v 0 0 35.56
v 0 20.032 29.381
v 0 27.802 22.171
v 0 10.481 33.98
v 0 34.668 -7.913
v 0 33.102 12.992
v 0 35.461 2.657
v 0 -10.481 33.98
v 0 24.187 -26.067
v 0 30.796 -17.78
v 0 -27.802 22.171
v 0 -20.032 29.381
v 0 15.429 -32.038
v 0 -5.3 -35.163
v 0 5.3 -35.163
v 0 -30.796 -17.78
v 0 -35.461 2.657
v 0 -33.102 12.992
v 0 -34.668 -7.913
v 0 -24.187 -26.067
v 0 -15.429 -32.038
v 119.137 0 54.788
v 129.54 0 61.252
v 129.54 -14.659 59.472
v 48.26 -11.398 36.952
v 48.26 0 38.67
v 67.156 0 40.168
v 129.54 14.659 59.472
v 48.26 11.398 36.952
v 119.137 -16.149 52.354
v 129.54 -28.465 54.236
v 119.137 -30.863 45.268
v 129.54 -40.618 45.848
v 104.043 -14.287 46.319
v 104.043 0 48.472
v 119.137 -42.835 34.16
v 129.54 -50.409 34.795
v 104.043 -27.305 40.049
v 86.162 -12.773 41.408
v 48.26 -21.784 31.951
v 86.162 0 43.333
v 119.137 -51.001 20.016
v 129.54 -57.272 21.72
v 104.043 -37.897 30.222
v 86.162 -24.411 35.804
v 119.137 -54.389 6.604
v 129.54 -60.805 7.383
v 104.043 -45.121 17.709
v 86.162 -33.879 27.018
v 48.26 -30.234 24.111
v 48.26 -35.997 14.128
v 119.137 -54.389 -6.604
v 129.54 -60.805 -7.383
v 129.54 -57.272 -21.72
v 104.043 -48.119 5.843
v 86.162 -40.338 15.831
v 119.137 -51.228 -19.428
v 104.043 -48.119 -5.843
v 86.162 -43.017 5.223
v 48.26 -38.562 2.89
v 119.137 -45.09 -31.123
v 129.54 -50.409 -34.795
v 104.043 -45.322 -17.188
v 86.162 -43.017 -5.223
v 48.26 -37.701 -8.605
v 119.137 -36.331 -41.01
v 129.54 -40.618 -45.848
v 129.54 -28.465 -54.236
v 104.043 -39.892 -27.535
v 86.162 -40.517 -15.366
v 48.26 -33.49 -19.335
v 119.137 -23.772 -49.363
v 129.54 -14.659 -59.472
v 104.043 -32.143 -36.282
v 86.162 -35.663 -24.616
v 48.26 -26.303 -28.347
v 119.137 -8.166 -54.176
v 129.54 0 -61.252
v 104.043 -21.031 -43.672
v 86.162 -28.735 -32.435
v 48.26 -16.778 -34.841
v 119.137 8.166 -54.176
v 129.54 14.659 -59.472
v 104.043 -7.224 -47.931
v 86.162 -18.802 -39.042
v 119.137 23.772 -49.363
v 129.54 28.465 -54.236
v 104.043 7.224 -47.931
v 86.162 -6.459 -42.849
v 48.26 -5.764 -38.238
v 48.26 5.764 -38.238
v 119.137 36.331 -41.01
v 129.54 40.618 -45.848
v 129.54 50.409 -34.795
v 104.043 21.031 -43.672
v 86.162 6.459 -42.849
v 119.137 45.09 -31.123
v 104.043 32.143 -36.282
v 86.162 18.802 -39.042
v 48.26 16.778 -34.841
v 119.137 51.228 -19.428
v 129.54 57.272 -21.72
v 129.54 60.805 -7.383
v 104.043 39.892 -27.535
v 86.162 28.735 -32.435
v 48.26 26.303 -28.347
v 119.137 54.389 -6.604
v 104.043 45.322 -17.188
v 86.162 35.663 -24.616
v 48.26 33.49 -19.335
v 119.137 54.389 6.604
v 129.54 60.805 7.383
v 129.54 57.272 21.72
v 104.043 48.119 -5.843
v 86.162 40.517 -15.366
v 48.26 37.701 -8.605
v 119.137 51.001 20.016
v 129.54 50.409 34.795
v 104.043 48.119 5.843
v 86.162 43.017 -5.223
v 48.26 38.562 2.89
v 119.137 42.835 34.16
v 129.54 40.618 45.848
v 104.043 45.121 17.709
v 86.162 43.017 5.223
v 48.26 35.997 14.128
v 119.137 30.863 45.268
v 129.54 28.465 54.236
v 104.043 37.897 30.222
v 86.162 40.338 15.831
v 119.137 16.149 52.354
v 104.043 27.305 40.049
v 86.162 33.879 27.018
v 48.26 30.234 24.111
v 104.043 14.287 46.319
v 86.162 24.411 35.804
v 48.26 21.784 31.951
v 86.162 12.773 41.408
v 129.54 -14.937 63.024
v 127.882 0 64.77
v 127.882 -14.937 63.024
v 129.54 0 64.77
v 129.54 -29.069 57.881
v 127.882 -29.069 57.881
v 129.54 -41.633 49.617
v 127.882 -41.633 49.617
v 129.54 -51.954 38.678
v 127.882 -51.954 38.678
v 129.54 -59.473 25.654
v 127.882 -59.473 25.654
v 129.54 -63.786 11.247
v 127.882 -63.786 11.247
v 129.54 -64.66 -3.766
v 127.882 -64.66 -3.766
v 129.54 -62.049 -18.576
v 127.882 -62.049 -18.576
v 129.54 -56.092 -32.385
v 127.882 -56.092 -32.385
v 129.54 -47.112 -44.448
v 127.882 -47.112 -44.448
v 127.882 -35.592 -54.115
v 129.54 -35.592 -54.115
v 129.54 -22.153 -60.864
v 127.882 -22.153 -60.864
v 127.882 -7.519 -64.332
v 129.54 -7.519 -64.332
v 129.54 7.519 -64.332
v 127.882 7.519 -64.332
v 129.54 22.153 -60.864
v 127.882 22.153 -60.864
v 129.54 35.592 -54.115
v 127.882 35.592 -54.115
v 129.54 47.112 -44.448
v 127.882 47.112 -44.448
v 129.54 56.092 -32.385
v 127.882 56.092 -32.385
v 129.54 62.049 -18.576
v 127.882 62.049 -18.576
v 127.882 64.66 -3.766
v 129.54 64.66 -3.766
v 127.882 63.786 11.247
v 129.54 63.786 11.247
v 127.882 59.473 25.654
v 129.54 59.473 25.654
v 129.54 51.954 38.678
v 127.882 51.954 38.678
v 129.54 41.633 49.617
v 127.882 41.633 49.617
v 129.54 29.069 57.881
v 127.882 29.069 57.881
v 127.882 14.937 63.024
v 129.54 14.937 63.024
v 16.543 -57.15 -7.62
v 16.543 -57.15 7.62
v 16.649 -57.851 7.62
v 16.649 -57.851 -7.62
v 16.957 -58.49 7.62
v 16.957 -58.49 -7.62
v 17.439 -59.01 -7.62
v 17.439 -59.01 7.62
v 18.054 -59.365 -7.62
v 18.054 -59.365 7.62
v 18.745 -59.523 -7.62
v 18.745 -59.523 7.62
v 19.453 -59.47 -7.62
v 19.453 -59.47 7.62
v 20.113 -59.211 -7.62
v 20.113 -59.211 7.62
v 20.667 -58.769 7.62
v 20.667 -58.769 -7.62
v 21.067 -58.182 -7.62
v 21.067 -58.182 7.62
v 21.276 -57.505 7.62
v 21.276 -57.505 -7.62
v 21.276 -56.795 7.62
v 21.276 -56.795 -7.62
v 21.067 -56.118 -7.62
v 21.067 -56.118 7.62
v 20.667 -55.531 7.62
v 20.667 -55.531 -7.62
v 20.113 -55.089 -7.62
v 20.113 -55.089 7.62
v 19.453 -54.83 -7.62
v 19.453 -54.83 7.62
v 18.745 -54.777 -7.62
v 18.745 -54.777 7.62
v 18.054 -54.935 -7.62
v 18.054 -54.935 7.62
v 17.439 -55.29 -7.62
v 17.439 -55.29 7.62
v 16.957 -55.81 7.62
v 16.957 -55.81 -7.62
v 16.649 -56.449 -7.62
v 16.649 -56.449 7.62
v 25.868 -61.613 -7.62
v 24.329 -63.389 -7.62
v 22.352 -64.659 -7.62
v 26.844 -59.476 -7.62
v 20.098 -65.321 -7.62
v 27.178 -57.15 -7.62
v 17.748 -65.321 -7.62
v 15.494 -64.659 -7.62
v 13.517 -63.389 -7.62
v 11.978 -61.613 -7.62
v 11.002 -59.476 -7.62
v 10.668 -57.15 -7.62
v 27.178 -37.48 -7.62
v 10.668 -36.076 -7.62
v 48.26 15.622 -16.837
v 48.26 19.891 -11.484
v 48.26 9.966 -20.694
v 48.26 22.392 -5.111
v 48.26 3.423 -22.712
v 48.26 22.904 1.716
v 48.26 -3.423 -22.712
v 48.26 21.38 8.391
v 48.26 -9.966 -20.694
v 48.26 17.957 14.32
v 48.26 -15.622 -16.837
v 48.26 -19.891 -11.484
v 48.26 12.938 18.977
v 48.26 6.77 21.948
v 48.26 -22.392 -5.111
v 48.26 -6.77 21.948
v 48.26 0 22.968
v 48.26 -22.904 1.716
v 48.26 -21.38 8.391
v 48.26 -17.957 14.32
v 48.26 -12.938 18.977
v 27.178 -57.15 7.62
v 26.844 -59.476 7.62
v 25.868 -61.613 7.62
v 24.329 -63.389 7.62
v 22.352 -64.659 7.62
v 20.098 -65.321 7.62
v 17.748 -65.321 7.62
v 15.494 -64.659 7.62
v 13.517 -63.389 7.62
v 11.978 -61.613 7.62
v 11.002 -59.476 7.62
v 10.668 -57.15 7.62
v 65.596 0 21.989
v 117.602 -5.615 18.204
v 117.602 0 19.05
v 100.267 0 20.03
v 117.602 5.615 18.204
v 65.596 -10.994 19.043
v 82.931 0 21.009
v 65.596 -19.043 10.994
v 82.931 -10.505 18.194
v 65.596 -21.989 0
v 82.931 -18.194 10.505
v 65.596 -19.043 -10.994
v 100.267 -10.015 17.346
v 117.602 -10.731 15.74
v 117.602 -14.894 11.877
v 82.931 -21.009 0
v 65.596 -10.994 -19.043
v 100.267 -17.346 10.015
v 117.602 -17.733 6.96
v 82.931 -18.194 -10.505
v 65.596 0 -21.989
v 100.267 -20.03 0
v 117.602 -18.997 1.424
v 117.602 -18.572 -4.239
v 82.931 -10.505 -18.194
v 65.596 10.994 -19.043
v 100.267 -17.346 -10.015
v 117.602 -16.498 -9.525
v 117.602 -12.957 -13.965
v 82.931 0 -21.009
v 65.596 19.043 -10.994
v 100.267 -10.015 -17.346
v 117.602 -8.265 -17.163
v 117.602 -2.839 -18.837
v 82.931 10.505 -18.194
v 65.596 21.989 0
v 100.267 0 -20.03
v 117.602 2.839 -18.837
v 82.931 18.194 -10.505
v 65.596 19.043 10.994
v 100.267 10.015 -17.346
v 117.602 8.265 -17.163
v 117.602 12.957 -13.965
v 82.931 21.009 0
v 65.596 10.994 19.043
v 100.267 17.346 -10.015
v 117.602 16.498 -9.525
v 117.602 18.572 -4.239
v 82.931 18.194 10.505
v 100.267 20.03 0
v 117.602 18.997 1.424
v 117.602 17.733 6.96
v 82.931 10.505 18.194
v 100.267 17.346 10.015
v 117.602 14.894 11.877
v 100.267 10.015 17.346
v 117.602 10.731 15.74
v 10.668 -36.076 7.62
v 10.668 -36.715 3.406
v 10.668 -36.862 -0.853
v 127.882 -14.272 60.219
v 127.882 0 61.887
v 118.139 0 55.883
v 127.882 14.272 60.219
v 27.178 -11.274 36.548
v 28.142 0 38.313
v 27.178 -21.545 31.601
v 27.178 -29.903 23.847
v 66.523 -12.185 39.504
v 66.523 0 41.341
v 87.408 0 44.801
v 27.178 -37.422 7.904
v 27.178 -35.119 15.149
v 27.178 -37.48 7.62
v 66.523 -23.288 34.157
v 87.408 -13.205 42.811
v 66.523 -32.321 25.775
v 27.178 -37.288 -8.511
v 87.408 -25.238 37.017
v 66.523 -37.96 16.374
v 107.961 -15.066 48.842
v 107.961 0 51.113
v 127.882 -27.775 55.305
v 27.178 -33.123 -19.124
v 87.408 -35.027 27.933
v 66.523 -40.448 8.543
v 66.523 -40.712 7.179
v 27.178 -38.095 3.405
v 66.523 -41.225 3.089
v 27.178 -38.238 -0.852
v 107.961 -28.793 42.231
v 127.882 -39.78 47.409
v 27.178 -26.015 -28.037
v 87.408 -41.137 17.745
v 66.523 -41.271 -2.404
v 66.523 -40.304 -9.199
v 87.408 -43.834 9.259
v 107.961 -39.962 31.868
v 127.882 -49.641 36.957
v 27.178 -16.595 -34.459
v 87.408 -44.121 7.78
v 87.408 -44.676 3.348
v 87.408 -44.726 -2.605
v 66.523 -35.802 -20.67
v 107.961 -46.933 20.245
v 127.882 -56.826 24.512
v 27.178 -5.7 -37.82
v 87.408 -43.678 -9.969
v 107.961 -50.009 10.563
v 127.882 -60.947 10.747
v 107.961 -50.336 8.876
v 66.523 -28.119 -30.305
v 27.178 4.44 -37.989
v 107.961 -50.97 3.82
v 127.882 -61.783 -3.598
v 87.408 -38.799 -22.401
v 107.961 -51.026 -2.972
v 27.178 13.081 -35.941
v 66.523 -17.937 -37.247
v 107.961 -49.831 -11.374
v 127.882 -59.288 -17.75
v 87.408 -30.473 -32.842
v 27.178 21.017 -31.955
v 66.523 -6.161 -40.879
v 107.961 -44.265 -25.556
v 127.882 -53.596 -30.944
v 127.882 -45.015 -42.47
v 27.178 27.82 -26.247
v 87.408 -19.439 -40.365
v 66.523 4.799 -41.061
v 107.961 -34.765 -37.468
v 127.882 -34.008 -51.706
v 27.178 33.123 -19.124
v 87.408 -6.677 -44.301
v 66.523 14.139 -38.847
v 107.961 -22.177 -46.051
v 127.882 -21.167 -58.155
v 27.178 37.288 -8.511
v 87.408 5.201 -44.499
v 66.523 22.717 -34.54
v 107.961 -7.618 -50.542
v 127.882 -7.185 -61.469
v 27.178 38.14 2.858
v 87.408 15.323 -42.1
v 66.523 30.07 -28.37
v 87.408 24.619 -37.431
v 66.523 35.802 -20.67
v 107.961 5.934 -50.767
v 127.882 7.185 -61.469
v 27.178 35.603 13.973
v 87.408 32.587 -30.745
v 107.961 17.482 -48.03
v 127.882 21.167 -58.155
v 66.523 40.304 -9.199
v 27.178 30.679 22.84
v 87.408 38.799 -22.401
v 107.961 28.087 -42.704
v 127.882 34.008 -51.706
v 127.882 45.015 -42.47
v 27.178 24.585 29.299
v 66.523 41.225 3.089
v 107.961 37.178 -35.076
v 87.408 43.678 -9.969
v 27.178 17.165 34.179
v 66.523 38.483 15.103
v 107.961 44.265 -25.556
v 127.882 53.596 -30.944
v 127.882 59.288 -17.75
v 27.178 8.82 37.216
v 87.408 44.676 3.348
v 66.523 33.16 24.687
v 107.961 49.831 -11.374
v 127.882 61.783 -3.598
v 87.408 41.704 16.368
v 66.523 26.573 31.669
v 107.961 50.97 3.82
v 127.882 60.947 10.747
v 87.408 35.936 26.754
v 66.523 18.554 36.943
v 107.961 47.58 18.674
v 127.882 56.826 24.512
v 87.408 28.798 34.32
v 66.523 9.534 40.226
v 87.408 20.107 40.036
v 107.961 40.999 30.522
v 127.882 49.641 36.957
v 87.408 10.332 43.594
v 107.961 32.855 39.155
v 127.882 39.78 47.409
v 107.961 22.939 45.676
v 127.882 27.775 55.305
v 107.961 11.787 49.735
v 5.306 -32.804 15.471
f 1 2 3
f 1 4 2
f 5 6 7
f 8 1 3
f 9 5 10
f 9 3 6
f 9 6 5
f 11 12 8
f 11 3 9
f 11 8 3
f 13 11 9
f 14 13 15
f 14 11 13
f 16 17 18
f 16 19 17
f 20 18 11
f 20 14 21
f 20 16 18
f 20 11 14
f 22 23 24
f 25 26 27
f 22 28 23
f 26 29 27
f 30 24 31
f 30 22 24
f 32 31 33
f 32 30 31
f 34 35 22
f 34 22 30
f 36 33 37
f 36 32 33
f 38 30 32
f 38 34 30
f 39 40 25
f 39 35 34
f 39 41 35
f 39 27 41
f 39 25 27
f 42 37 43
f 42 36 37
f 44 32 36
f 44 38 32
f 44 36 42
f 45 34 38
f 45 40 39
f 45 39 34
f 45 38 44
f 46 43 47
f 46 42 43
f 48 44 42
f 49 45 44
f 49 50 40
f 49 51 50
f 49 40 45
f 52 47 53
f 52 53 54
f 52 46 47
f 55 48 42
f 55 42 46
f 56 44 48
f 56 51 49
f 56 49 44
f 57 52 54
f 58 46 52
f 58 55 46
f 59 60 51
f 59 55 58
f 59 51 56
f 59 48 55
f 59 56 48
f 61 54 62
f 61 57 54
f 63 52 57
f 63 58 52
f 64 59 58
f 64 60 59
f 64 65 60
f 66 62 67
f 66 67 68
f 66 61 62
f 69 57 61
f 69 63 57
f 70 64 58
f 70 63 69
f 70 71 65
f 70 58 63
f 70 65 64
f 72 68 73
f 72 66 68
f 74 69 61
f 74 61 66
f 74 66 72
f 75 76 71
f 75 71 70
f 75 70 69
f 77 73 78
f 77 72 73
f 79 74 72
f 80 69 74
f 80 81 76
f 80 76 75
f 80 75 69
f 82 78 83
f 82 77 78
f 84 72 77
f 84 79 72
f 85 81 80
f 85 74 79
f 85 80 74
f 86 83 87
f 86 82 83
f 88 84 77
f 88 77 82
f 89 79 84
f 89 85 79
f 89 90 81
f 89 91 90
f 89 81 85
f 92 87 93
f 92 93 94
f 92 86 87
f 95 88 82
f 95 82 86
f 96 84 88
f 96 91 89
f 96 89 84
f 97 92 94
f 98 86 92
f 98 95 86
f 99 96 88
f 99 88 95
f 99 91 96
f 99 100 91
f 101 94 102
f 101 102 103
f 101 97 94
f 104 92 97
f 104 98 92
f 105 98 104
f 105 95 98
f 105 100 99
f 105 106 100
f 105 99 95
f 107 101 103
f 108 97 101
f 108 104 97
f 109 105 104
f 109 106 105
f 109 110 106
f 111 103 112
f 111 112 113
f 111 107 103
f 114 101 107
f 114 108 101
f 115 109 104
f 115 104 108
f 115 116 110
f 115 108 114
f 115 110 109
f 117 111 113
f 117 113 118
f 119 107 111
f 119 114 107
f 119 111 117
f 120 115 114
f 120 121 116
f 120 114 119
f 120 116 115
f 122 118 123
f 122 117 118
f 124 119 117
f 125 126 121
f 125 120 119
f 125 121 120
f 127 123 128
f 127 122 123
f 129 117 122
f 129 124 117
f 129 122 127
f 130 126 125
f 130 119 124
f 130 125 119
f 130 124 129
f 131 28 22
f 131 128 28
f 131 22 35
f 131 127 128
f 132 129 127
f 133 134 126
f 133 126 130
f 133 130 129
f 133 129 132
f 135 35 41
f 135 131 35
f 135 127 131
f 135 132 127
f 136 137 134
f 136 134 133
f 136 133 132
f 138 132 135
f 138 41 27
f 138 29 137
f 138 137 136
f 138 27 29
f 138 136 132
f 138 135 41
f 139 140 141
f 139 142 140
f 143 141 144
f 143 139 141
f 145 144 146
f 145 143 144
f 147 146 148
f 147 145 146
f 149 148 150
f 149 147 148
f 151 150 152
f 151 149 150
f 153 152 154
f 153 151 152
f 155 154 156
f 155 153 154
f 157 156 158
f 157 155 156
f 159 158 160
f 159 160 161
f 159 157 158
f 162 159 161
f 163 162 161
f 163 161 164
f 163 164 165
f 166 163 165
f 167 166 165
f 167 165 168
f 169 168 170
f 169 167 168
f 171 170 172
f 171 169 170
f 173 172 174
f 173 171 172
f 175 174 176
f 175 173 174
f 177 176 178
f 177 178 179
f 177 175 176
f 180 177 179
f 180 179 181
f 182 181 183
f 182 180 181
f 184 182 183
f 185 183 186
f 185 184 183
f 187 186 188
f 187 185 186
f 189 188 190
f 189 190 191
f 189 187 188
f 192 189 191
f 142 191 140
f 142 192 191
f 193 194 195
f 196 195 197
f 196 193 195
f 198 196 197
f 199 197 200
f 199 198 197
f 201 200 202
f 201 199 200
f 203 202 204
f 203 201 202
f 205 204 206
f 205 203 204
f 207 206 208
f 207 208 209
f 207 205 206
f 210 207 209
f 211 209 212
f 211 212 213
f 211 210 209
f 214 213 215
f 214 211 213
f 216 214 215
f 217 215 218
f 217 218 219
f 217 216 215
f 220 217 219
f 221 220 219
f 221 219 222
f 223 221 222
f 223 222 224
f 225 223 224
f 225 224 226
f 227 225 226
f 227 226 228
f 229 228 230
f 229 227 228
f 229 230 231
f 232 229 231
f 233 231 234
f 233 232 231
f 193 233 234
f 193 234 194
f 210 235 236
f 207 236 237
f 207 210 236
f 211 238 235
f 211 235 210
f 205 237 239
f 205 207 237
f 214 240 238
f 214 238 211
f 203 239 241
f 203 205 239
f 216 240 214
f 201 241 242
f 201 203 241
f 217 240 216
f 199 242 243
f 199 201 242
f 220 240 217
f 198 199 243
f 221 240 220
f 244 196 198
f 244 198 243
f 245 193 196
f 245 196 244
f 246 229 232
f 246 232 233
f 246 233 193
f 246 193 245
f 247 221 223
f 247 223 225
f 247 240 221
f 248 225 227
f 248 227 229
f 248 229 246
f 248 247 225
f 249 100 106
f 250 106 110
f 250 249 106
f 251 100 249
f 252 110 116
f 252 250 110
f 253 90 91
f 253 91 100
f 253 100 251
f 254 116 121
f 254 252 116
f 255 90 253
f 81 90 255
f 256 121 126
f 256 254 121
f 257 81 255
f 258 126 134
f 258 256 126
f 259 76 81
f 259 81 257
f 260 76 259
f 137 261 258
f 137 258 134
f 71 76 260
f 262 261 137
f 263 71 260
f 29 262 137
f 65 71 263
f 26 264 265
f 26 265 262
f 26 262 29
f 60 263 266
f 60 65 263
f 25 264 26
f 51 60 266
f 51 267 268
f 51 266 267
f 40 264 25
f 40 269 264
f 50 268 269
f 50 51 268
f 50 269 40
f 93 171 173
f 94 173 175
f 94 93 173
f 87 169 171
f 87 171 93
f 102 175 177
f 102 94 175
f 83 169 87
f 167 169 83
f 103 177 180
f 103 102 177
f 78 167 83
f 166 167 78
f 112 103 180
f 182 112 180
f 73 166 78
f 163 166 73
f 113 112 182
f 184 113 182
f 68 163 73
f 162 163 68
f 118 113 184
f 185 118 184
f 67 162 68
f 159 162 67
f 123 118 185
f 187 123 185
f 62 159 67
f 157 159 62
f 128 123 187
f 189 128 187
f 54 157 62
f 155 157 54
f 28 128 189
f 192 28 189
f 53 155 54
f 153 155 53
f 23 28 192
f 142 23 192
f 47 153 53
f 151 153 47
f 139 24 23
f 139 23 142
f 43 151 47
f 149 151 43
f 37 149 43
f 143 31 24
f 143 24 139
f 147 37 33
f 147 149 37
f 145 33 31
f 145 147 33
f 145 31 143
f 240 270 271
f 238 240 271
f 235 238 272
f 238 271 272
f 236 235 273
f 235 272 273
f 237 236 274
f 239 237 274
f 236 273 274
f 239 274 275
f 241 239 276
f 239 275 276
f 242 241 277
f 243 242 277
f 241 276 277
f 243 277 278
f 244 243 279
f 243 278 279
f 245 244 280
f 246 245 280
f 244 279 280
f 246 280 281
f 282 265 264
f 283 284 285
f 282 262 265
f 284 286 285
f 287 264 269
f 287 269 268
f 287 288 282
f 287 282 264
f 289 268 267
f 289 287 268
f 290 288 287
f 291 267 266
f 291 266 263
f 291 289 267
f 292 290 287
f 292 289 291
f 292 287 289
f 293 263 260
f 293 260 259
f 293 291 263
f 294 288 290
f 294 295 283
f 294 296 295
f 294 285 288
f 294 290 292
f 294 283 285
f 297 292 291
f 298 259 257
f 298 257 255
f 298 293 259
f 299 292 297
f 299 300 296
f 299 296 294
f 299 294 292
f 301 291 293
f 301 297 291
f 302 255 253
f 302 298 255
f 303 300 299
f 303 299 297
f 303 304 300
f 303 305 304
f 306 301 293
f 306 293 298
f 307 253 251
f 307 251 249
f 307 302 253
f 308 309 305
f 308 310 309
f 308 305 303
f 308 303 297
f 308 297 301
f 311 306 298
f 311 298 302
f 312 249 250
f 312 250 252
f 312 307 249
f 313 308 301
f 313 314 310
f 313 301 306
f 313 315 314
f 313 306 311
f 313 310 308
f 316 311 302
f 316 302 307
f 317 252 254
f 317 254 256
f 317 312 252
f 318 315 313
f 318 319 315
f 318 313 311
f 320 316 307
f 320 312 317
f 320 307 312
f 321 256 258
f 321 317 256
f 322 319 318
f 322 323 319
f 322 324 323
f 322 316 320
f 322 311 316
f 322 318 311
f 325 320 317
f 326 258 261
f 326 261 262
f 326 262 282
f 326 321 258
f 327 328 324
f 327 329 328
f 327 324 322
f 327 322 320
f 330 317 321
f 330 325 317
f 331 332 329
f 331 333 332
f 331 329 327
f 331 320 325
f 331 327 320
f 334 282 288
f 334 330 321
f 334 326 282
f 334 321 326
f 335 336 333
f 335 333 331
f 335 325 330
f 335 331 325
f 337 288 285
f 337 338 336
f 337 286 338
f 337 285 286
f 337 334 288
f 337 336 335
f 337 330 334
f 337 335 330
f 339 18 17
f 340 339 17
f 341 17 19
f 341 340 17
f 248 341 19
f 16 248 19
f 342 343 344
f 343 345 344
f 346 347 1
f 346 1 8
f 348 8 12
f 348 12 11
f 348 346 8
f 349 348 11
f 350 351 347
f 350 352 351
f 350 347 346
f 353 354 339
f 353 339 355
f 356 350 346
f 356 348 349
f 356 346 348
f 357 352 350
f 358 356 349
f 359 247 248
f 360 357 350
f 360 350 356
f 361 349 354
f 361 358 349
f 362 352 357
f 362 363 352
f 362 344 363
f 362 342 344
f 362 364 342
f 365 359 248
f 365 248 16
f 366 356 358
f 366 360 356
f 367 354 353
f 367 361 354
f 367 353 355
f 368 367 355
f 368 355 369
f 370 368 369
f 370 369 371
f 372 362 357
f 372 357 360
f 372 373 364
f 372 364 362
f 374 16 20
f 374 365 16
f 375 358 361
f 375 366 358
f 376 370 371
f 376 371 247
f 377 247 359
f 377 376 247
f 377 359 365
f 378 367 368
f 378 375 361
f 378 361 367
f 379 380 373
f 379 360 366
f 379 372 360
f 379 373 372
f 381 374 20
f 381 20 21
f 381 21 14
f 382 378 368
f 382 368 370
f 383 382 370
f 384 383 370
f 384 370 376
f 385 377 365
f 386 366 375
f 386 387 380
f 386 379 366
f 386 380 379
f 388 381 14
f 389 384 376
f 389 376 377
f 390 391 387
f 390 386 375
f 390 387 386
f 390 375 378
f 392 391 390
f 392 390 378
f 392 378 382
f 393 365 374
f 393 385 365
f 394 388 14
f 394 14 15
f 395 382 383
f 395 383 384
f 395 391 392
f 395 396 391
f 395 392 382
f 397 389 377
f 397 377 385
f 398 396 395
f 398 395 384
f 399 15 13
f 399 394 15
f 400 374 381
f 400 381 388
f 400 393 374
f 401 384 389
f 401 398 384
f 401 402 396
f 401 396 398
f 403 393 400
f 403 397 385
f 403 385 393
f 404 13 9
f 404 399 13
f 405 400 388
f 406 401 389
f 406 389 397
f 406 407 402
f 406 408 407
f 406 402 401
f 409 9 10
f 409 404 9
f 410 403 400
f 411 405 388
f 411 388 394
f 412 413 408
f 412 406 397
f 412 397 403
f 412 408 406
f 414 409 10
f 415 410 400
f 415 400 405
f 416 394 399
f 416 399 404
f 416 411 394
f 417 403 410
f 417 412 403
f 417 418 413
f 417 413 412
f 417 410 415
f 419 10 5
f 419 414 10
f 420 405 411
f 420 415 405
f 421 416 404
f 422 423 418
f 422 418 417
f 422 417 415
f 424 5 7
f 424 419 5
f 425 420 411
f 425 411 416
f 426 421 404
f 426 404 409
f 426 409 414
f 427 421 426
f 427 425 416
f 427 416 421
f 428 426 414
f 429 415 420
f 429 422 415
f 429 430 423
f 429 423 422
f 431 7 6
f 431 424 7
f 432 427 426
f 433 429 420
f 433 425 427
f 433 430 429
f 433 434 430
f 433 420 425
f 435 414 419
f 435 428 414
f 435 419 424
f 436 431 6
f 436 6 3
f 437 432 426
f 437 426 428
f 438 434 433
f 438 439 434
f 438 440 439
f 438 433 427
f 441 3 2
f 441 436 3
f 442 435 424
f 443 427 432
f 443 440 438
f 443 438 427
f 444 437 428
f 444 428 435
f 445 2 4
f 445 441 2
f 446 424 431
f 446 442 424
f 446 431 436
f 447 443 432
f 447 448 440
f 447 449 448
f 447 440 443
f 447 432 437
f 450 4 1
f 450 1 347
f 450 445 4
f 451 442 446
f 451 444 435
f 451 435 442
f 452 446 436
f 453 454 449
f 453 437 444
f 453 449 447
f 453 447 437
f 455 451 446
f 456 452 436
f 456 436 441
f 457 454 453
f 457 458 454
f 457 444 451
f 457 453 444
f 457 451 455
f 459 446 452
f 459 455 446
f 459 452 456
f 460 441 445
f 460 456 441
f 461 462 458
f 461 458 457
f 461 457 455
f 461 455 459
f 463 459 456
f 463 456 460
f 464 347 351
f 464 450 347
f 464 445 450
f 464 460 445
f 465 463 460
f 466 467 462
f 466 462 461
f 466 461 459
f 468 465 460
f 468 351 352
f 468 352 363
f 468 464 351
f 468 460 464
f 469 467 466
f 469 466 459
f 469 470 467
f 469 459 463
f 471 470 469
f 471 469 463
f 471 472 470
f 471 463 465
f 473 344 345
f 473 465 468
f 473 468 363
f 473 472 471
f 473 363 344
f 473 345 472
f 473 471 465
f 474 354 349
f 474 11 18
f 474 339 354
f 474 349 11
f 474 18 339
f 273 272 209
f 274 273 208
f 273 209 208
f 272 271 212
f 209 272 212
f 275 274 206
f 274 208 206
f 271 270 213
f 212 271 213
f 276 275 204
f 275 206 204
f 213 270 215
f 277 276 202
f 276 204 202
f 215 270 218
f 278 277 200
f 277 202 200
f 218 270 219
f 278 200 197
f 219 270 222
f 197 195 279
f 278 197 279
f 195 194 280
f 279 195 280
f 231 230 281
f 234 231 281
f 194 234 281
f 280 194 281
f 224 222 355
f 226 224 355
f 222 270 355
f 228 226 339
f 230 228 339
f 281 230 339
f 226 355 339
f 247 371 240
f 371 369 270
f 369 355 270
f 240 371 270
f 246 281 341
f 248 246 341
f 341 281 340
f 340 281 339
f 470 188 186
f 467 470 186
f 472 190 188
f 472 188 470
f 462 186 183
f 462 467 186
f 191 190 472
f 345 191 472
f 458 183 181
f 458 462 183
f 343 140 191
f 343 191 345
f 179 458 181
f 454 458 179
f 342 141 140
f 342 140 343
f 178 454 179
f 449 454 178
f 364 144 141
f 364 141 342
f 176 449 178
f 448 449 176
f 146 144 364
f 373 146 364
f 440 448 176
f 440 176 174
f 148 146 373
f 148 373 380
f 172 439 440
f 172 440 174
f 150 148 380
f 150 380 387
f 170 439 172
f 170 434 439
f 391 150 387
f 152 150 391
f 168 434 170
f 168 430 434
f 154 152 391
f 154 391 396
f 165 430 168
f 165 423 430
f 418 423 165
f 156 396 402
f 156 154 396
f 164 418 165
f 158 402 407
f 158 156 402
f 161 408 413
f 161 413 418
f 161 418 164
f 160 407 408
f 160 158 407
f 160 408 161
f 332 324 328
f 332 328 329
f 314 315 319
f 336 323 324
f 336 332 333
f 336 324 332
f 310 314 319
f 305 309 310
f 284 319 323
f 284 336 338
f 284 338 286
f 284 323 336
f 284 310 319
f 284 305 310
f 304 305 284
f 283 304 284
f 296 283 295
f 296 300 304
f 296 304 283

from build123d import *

# Parameters (mm, degrees)
SKETCH2_R           = 2.379603086
BOSS_EXTRUDE1_DEPTH = 7.62


with BuildPart() as part:
    # Sketch1 → Revolve1 (revolve)
    with BuildSketch(Plane.XY, mode=Mode.PRIVATE) as revolve1_sk:
        with BuildLine():
            Line((0, 0), (0, 35.56))
            add(Edge.make_bspline(
                [(0, 35.56), (42.301500734, 41.721758618), (90.804413229, 35.842754911), (127.882024274, 61.887461876)],
                knots=[0, 0, 0, 0, 1, 1, 1, 1], degree=3))
            Line((127.882024274, 61.887461876), (127.882024274, 64.77))
            Line((127.882024274, 64.77), (129.54, 64.77))
            Line((129.54, 64.77), (129.54, 61.251991837))
            add(Edge.make_bspline(
                [(129.54, 61.251991837), (122.108766376, 55.034053504), (92.759656323, 42.350538828), (60.579168052, 39.262131274), (48.26, 38.670416418)],
                knots=[0, 0, 0, 0, 0.471040278, 0.787254412, 0.787254412, 0.787254412, 0.787254412], degree=3))
            Line((48.26, 38.670416418), (48.26, 22.968138033))
            Line((48.26, 22.968138033), (117.602, 19.05))
            Line((117.602, 19.05), (117.602, 0))
            Line((117.602, 0), (0, 0))
        make_face()
    revolve(revolve1_sk.sketch.rotate(Axis((0, 0, 0), (1, 0, 0)), 90), axis=Axis((0, 0, 0), (1, 0, 0)))

    # Sketch2 → Boss-Extrude1 (add, symmetric)
    with BuildSketch(Plane.XY):
        with BuildLine():
            Line((10.668, -57.15), (10.668, 0))
            Line((10.668, 0), (27.178, 0))
            Line((27.178, 0), (27.178, -57.15))
            ThreePointArc((27.178, -57.15), (18.923, -65.405), (10.668, -57.15))
        make_face()
        with Locations(Location((18.923, -57.15, 0), (0, 0, 180))):
            Circle(SKETCH2_R, mode=Mode.SUBTRACT)
    extrude(amount=BOSS_EXTRUDE1_DEPTH, both=True)


solid = part.part
